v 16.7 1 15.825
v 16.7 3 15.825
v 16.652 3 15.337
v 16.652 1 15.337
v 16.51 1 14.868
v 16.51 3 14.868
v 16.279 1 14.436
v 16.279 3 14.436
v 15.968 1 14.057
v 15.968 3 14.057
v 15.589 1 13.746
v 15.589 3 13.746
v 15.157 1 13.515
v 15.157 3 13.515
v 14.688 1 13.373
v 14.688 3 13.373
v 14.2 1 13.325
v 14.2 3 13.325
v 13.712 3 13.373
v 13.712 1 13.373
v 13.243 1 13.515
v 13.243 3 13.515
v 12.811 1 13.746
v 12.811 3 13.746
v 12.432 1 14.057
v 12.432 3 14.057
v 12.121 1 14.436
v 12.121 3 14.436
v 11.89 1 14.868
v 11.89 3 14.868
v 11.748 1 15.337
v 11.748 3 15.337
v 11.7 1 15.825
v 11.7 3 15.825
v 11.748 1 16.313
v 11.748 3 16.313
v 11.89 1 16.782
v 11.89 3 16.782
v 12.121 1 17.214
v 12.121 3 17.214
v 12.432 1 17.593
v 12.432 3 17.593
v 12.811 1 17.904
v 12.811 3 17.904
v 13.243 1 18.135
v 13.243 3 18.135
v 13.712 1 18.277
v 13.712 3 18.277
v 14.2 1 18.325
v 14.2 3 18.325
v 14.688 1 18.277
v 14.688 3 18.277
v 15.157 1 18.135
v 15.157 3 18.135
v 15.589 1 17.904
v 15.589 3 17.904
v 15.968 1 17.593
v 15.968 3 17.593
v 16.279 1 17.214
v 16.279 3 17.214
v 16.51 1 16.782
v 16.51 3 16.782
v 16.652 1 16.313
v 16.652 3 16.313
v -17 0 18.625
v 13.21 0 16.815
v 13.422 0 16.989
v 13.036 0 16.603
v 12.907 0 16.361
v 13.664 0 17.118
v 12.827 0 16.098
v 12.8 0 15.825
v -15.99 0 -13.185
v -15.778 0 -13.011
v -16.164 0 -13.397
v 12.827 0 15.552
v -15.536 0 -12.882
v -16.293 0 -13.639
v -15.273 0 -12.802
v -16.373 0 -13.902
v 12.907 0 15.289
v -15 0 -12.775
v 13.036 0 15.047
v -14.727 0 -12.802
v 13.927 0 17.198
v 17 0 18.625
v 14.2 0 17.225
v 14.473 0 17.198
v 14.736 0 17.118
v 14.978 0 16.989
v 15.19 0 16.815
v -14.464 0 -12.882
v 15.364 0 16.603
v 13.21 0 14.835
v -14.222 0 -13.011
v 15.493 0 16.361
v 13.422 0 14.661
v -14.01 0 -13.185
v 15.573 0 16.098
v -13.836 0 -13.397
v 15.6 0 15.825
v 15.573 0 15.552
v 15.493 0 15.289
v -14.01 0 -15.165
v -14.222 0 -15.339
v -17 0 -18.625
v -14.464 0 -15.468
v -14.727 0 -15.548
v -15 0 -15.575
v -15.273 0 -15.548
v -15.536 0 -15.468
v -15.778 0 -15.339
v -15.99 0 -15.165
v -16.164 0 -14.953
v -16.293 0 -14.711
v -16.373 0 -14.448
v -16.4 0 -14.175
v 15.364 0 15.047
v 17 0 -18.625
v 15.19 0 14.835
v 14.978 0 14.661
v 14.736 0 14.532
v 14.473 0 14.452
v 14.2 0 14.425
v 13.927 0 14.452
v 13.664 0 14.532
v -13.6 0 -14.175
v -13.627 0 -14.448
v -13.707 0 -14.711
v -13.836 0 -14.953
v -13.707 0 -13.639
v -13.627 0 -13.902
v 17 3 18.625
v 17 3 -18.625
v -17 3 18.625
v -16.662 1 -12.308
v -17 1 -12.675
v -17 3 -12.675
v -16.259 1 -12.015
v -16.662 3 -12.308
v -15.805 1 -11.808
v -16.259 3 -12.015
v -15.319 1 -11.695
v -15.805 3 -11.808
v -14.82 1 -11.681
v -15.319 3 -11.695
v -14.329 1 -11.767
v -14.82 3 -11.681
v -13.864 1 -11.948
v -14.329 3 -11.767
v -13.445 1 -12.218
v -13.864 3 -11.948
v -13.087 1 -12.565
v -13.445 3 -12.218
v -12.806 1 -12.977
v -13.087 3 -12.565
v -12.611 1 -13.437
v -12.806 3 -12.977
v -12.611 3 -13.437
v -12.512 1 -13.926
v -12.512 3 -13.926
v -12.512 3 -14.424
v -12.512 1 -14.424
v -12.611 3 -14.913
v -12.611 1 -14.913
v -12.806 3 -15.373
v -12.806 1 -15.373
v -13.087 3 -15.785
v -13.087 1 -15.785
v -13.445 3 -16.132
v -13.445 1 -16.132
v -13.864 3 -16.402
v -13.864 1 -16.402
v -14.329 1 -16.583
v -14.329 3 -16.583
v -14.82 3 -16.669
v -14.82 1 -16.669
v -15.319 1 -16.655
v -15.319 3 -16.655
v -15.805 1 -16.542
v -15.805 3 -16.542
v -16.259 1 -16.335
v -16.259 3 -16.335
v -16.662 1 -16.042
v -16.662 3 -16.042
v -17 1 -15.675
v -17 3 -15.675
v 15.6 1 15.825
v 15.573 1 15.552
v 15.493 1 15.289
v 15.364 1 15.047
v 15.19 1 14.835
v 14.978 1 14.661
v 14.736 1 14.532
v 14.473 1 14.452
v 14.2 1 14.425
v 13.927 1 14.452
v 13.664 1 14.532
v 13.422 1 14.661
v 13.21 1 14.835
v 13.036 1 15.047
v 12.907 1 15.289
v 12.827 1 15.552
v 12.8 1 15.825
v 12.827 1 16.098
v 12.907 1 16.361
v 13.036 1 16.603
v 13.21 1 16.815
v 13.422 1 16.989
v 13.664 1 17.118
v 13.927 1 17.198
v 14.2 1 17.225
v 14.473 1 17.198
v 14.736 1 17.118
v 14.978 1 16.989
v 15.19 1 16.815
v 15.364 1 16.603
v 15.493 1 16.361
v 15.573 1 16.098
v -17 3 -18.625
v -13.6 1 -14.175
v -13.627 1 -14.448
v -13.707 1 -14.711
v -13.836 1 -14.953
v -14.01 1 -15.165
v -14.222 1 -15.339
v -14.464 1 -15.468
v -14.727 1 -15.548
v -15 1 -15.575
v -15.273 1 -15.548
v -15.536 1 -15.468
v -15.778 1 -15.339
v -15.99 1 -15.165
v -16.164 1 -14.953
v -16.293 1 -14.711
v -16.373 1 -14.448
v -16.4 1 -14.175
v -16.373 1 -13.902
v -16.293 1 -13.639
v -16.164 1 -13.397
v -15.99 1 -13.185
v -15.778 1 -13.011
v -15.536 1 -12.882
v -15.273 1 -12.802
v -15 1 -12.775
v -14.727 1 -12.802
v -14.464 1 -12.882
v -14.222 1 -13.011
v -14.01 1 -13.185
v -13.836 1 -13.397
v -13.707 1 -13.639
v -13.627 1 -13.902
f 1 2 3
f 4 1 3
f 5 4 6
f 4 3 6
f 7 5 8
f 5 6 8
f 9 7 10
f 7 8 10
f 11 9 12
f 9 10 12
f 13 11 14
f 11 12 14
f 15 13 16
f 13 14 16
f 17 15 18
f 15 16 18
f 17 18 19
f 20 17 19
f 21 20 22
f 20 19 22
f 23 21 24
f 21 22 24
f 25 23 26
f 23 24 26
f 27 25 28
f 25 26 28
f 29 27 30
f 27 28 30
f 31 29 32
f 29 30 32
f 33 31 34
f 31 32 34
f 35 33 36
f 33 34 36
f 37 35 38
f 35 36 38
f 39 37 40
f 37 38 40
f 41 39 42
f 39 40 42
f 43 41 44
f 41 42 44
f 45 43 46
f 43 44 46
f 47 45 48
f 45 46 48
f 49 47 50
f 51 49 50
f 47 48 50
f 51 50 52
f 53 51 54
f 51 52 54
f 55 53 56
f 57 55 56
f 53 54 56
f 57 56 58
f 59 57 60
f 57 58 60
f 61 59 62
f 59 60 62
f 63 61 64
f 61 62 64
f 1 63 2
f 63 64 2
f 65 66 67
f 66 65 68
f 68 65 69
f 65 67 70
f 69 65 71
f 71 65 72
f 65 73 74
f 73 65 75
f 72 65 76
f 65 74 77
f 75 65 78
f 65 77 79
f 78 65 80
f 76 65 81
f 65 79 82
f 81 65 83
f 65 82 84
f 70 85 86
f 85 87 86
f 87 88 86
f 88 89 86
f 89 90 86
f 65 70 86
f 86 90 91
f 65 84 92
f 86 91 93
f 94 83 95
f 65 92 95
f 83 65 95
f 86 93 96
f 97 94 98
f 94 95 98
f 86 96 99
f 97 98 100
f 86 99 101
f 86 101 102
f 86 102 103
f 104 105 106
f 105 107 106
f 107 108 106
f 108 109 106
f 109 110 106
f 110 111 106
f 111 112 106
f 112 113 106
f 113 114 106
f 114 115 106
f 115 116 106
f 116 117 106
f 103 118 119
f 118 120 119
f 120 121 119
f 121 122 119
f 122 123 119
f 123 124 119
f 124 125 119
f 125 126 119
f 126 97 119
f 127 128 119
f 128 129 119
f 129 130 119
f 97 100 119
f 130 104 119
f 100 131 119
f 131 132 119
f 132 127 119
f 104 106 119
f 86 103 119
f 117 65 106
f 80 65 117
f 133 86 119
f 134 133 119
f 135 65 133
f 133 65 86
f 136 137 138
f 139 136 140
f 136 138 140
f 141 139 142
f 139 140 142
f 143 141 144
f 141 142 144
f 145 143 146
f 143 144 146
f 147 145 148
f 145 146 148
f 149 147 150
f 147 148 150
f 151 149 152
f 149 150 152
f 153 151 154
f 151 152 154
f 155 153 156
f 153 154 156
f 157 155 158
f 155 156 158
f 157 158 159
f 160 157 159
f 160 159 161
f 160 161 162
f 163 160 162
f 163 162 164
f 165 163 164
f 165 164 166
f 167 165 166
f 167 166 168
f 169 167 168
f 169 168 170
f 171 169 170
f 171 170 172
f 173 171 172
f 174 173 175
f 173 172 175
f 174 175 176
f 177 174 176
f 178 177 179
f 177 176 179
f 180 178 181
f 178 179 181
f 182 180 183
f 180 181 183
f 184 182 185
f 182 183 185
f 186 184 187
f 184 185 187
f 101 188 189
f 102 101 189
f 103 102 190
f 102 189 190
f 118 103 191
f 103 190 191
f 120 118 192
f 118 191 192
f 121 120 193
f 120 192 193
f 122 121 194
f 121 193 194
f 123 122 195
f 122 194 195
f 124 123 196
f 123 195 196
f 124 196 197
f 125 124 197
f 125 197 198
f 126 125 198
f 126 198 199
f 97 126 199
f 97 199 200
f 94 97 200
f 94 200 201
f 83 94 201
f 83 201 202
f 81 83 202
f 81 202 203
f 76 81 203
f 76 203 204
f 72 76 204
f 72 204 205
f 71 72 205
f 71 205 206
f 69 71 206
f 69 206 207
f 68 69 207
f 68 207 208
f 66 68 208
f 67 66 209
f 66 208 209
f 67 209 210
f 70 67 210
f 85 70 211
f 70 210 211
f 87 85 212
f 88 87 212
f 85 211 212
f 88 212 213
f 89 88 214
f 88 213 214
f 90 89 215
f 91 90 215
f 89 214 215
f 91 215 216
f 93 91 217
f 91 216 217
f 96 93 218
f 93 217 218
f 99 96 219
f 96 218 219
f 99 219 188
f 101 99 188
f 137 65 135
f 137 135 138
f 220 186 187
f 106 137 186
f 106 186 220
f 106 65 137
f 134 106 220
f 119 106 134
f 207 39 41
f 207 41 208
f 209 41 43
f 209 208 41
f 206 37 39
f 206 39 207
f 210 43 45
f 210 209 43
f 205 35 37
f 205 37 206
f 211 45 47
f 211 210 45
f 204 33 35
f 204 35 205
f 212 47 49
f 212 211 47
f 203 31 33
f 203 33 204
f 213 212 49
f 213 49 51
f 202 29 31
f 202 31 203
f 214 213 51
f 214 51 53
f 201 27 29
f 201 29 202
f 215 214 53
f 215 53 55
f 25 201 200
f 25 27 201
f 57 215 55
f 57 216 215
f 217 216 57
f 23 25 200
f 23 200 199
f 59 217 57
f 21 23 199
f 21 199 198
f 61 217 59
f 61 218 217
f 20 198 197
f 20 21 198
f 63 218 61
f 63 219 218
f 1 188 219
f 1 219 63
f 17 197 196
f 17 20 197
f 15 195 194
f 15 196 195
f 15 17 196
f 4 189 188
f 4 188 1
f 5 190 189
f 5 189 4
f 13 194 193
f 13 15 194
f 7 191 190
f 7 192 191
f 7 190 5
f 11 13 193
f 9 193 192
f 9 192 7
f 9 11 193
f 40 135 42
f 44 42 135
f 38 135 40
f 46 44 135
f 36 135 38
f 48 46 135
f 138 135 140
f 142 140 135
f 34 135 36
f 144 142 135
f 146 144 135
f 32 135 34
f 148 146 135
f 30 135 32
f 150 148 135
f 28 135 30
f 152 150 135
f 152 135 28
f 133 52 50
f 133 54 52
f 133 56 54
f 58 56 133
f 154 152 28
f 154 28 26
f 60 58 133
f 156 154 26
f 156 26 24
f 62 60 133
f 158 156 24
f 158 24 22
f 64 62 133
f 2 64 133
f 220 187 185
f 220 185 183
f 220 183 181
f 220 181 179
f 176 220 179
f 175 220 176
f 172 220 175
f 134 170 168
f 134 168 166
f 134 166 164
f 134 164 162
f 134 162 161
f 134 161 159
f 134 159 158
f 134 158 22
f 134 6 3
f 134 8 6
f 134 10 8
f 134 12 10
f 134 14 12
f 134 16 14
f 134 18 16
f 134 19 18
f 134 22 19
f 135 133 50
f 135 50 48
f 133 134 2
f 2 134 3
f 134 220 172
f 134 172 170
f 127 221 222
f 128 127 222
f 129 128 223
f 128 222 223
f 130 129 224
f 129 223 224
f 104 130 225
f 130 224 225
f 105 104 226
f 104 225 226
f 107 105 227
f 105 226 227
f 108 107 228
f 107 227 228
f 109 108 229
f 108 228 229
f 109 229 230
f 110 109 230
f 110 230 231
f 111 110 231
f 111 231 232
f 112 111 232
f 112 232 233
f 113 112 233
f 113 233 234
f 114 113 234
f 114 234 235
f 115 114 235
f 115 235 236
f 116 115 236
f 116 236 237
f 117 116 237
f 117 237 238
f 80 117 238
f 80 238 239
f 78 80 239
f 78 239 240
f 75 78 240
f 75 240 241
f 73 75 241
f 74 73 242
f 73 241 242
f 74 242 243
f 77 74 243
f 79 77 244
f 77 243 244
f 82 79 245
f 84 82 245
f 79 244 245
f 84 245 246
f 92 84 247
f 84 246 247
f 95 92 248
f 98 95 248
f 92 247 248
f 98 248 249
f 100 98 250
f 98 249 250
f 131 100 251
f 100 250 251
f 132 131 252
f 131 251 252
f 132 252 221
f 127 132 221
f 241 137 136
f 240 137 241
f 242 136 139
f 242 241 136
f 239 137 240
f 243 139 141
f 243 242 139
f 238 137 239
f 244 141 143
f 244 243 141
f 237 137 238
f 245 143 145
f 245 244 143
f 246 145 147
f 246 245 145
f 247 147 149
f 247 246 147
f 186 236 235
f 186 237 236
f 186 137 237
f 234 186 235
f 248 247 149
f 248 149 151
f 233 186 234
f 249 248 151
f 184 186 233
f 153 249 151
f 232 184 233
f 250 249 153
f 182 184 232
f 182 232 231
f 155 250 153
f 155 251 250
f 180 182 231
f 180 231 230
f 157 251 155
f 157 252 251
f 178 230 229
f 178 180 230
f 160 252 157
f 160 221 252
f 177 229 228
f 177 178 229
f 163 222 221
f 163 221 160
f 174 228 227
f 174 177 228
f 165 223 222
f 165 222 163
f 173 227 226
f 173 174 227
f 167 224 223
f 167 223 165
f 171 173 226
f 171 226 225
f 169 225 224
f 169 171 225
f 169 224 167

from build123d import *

# Parameters (mm, degrees)
SKETCH1_W           = 34
SKETCH1_H           = 37.25
BOSS_EXTRUDE1_DEPTH = 3
SKETCH2_R           = 2.5
CUT_EXTRUDE1_DEPTH  = 2
SKETCH3_R           = 1.4
CUT_EXTRUDE2_DEPTH  = 2


with BuildPart() as part:
    # Sketch1 → Boss-Extrude1 (new body)
    with BuildSketch(Plane(origin=(0, 0, 0), x_dir=(1, 0, 0), z_dir=(0, 1, 0))):
        Rectangle(SKETCH1_W, SKETCH1_H)
    extrude(amount=BOSS_EXTRUDE1_DEPTH)

    # Sketch2 → Cut-Extrude1 (cut)
    with BuildSketch(Plane(origin=(0, 3, 0), x_dir=(1, 0, 0), z_dir=(0, 1, 0))):
        with Locations((-15, 14.175)):
            Circle(SKETCH2_R)
        with Locations((14.2, -15.825)):
            Circle(SKETCH2_R)
    extrude(amount=-CUT_EXTRUDE1_DEPTH, mode=Mode.SUBTRACT)

    # Sketch3 → Cut-Extrude2 (cut)
    with BuildSketch(Plane(origin=(0, 1, 0), x_dir=(1, 0, 0), z_dir=(0, 1, 0))):
        with Locations((-15, 14.175)):
            Circle(SKETCH3_R)
        with Locations((14.2, -15.825)):
            Circle(SKETCH3_R)
    extrude(amount=-CUT_EXTRUDE2_DEPTH, mode=Mode.SUBTRACT)


solid = part.part
